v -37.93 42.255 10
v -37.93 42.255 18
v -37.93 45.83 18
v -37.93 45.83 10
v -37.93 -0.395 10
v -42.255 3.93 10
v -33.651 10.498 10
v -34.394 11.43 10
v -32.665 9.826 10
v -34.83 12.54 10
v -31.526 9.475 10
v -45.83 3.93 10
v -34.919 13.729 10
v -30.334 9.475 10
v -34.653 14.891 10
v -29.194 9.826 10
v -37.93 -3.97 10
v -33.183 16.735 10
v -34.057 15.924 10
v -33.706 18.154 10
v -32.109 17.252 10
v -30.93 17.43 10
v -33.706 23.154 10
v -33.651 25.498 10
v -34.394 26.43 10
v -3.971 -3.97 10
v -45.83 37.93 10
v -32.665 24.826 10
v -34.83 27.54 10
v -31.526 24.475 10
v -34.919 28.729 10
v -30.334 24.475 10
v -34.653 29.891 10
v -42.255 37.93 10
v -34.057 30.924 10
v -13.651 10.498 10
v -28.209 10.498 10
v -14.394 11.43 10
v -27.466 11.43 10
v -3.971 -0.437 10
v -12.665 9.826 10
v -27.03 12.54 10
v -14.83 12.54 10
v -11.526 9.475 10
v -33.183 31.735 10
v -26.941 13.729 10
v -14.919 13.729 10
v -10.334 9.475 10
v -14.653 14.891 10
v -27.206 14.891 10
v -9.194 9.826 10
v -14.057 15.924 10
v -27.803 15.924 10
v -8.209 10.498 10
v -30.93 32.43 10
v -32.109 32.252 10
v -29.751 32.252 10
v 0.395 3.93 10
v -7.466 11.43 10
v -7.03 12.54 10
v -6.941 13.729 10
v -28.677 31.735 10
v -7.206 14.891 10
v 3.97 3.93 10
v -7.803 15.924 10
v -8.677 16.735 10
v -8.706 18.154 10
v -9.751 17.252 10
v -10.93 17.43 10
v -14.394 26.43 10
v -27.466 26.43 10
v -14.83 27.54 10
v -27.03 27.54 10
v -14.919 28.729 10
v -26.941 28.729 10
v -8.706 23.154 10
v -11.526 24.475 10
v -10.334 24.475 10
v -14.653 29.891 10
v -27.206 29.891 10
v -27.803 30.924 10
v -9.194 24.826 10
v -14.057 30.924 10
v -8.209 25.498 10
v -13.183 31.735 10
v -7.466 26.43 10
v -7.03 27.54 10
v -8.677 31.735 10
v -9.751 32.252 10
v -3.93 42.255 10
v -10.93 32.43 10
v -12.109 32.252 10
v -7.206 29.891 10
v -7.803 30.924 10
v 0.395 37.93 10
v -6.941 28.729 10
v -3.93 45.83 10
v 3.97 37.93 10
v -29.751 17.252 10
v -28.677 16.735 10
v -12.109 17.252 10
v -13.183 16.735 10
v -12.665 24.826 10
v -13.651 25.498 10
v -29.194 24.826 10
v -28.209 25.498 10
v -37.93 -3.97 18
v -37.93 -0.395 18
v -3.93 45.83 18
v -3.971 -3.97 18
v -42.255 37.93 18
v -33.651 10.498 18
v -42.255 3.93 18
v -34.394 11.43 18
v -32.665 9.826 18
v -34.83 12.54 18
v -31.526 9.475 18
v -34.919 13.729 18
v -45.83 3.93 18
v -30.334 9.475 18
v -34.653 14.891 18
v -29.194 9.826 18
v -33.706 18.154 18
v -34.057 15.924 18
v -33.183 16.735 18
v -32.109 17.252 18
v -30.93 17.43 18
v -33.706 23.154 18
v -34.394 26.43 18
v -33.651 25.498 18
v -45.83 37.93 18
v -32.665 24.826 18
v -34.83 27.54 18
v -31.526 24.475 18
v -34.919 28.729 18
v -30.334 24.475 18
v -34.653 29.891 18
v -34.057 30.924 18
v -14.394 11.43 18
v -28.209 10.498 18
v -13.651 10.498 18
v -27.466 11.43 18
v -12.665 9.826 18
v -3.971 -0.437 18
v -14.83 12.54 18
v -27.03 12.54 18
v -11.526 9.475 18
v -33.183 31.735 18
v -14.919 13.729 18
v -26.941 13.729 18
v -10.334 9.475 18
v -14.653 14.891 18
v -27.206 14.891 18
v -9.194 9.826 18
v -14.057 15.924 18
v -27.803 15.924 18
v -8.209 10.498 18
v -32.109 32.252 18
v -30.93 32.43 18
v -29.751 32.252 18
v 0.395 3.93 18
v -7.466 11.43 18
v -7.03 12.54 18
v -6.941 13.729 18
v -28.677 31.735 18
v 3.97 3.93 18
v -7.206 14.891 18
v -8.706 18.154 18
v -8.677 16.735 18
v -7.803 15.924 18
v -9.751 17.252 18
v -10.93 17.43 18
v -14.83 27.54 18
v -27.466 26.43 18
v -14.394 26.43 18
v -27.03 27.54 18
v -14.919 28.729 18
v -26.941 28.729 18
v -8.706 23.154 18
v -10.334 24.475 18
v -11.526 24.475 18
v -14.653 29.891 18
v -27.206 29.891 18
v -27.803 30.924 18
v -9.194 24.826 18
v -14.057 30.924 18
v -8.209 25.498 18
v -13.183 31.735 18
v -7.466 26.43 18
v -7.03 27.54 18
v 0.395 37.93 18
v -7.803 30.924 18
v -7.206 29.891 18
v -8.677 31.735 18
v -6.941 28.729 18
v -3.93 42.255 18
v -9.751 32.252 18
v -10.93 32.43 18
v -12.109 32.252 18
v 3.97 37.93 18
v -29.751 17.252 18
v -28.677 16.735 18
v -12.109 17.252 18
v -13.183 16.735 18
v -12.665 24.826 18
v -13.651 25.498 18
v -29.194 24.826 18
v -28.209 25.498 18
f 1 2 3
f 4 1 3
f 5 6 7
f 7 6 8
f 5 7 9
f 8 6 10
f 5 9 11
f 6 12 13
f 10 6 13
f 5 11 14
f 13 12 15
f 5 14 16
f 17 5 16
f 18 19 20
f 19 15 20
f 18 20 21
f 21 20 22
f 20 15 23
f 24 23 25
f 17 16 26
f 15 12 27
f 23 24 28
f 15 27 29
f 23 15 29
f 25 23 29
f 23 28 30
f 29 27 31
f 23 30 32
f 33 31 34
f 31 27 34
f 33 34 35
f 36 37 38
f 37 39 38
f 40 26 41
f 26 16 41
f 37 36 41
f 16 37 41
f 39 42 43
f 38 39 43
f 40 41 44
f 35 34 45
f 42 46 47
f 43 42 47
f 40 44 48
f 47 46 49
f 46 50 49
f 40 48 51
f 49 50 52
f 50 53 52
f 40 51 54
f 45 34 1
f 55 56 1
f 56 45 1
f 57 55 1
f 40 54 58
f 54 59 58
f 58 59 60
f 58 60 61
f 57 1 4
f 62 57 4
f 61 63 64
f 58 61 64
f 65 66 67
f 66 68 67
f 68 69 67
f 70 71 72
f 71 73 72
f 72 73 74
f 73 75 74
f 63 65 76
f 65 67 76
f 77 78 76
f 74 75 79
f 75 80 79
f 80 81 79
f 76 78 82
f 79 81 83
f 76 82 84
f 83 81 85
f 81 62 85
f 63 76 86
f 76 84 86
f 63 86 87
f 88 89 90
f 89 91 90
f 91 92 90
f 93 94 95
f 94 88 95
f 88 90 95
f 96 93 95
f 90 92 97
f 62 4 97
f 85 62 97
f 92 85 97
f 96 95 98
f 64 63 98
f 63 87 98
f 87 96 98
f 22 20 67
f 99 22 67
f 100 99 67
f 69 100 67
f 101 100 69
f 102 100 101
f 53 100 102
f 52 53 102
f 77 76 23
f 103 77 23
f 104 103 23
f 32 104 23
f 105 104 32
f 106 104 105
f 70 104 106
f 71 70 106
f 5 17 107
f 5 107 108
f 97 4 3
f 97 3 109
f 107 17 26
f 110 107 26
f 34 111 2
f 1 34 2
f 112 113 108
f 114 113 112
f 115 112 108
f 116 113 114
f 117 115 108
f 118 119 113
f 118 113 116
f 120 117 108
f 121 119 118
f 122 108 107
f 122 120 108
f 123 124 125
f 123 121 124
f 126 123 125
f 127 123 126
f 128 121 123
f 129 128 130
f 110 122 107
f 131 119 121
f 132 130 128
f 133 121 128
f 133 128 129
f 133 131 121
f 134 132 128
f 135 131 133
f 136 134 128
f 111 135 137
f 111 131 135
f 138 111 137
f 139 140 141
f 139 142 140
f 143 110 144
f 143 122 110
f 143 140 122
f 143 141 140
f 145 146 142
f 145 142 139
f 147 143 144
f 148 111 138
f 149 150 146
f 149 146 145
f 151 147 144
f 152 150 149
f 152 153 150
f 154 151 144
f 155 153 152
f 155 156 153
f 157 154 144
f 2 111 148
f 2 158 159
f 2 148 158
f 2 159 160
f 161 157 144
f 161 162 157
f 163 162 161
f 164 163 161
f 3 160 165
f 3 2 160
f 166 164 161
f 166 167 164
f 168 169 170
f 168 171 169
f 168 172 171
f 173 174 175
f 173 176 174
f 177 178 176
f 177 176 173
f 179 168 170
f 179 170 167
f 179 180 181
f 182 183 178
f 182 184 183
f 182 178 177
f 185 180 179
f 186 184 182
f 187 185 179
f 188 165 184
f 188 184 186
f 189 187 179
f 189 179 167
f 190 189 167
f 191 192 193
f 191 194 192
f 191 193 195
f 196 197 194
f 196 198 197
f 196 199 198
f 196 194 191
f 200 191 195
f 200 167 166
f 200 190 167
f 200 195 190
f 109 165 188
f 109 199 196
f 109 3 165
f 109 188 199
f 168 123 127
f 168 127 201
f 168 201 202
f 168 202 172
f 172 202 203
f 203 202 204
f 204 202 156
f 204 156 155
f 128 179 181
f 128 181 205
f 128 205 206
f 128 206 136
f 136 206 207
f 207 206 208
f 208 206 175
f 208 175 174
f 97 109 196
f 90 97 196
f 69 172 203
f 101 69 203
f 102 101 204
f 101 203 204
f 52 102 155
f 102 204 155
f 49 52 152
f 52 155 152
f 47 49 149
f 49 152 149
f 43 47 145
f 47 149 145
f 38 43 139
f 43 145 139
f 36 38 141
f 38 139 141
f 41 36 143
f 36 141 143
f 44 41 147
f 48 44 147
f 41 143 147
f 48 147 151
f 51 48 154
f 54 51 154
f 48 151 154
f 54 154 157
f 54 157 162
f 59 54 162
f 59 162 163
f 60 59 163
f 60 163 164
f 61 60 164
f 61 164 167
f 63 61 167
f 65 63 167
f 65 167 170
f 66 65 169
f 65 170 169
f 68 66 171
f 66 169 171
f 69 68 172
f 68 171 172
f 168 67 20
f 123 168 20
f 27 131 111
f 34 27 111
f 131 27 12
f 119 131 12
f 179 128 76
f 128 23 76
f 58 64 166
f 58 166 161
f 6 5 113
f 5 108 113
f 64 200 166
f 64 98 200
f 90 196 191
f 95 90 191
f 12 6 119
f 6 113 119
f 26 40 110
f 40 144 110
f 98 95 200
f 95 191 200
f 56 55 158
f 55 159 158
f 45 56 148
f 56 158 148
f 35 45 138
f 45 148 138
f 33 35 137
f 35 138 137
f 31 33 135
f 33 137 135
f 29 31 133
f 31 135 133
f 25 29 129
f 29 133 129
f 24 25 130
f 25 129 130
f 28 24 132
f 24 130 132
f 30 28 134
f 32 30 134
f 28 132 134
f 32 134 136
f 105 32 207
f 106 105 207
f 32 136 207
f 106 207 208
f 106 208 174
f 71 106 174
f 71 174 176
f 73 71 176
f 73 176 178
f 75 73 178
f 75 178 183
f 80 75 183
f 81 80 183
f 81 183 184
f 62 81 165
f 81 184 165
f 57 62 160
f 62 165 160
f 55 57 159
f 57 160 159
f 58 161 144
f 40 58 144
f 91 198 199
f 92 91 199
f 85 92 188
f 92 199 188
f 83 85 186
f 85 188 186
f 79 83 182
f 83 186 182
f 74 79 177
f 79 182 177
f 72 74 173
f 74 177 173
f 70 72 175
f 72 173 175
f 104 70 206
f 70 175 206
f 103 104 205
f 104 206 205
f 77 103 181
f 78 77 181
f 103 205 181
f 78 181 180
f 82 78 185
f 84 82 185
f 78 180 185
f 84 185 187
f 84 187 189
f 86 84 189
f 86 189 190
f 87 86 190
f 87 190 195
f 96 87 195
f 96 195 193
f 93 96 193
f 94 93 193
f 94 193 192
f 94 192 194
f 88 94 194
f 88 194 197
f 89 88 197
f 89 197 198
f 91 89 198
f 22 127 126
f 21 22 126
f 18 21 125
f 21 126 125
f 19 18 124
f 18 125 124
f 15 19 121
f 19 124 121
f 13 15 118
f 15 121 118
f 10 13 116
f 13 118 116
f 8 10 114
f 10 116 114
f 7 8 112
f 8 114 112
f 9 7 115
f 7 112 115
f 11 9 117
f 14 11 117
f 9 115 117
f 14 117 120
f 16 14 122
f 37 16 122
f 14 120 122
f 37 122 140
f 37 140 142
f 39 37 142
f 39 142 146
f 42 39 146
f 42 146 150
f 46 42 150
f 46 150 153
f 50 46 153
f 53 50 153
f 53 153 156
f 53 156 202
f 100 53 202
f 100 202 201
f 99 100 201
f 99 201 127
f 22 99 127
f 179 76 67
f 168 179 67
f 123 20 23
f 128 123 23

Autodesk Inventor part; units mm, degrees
ref_plane "YZ Plane" through (0, 0, 0) normal (1, 0, 0) x (0, 1, 0)
ref_plane "XZ Plane" through (0, 0, 0) normal (0, 1, 0) x (-1, 0, 0)
ref_plane "Work Plane1" through (0, 0, 10) normal (0, 0, 1) x (1, 0, 0)
sketch "Sketch1" plane through (0, 0, 10) normal (0, 0, 1) x (1, 0, 0)
  line L0 (-4.0299, -0.3538) -> (-2.2322, 1.4439) construction
  arc A0 (-1.4439, 2.2322) -> (-2.2322, 1.4439) centre (-0.9299, 0.9299) ccw construction
  line L1 (-1.4439, 2.2322) -> (0.3538, 4.0299) construction
  line L2 (-37.8299, 42.8299) -> (-37.8299, 37.8299) construction
  line L3 (-37.8299, 37.8299) -> (-42.9208, 37.8299) construction
  line L4 (-37.8299, 42.2137) -> (-37.8299, 45.8299) construction
  line L5 (-37.8299, 45.8299) -> (-4.0299, 45.8299) construction
  line L6 (-4.0299, 45.8299) -> (-4.0299, 42.2137) construction
  line L7 (-4.0299, 4.0299) -> (0.3538, 4.0299) projected
  circle A1 centre (-20.9299, 20.9299) radius 17.5 projected
  line L8 (-20.9299, 58.9723) -> (17.1124, 20.9299) construction
  line L9 (17.1124, 20.9299) -> (-20.9299, -17.1124) construction
  line L10 (-20.9299, -17.1124) -> (-58.9723, 20.9299) construction
  line L11 (-58.9723, 20.9299) -> (-20.9299, 58.9723) construction
  line L12 (-20.9299, 58.9723) -> (-20.9299, -17.1124) construction
  line L13 (17.1124, 20.9299) -> (-58.9723, 20.9299) construction
  line L14 (-20.9299, 58.9723) -> (32.8701, 58.9723) construction
  line L15 (-43.4299, 43.4299) -> (1.5701, 43.4299) construction
  line L16 (1.5701, 43.4299) -> (1.5701, -1.5701) construction
  line L17 (1.5701, -1.5701) -> (-43.4299, -1.5701) construction
  line L18 (-43.4299, -1.5701) -> (-43.4299, 43.4299) construction
  line L19 (-43.4299, 43.4299) -> (1.5701, -1.5701) construction
  line L20 (1.5701, 43.4299) -> (-43.4299, -1.5701) construction
  line L21 (-43.4299, 5.3876) -> (-43.4299, 36.4723)
  line L22 (-43.4299, 36.4723) -> (-36.4723, 43.4299)
  line L23 (-36.4723, 43.4299) -> (-5.3876, 43.4299)
  line L24 (-5.3876, 43.4299) -> (1.5701, 36.4723)
  line L25 (1.5701, 36.4723) -> (1.5701, 5.3876)
  line L26 (1.5701, 5.3876) -> (-5.3876, -1.5701)
  line L27 (-5.3876, -1.5701) -> (-36.4723, -1.5701)
  line L28 (-36.4723, -1.5701) -> (-43.4299, 5.3876)
  line L29 (-4.0299, 42.2137) -> (-37.8299, 42.2137) projected
  line L30 (-4.0299, -0.3538) -> (-4.0299, 4.0299) projected
  circle A2 centre (-20.9299, 20.9299) radius 1.5
  line L31 (-10.9299, 10.9299) -> (-30.9299, 10.9299) construction
  line L32 (-30.9299, 10.9299) -> (-30.9299, 30.9299) construction
  line L33 (-30.9299, 30.9299) -> (-10.9299, 30.9299) construction
  line L34 (-10.9299, 30.9299) -> (-10.9299, 10.9299) construction
  line L35 (-10.9299, 10.9299) -> (-30.9299, 30.9299) construction
  line L36 (-30.9299, 10.9299) -> (-10.9299, 30.9299) construction
  circle A3 centre (-30.9299, 30.9299) radius 1.4
  circle A4 centre (-30.9299, 10.9299) radius 1.4
  circle A5 centre (-10.9299, 10.9299) radius 1.4
  line L37 (-45.8299, 37.8299) -> (-42.0723, 37.8299) construction
  line L38 (-42.1723, 37.7299) -> (-45.8299, 37.7299)
  line L39 (-45.8299, 37.7299) -> (-45.8299, 4.1299)
  line L40 (-45.8299, 4.1299) -> (-42.1723, 4.1299)
  line L41 (-42.1723, 4.1299) -> (-42.1723, 37.7299)
  line L42 (-45.8299, 4.0299) -> (-42.0723, 4.0299) construction
  line L43 (-45.8299, 37.8299) -> (-42.0723, 37.8299) projected
  line L44 (-37.7299, 45.8299) -> (-4.1299, 45.8299)
  line L45 (-4.1299, 45.8299) -> (-4.1299, 42.1723)
  line L46 (-4.1299, 42.1723) -> (-37.7299, 42.1723)
  line L47 (-37.7299, 42.1723) -> (-37.7299, 45.8299)
  line L48 (0.4701, 37.8299) -> (0.4701, 4.0299) construction
  line L49 (0.4701, 4.0299) -> (3.9701, 4.0299) construction
  line L50 (3.9701, 37.8299) -> (3.9701, 4.0299) construction
  line L51 (0.4701, 37.8299) -> (3.9701, 37.8299) construction
  line L52 (-45.8299, -3.9701) -> (-4.0299, -3.9701) construction
  line L53 (0.3124, 37.7299) -> (3.9701, 37.7299)
  line L54 (3.9701, 37.7299) -> (3.9701, 4.1299)
  line L55 (3.9701, 4.1299) -> (0.3124, 4.1299)
  line L56 (0.3124, 4.1299) -> (0.3124, 37.7299)
  line L57 (-4.1713, -0.3538) -> (-37.7299, -0.3538)
  line L58 (-37.7299, -0.3538) -> (-37.7299, -3.9701)
  line L59 (-37.7299, -3.9701) -> (-4.1713, -3.9701)
  line L60 (-4.1713, -3.9701) -> (-4.1713, -0.3538)
  point P0 (-37.8299, 4.0299)
  dimension "d18" = 53.8
  dimension "d19" = 45
  dimension "d20" = 53.8
  dimension "d21" = 45
  dimension "d22" = 45
  dimension "d30" = 20
  dimension "d31" = 20
  dimension "d32" = 2.8
  dimension "d33" = 2.8
  dimension "d34" = 2.8
  dimension "d35" = 3
  dimension "d36" = 0.1
  dimension "d37" = 0.1
  dimension "d38" = 0.1
  dimension "d39" = 0.1
extrude "Extrusion1" add sketch "Sketch1" along normal blind 8 contours L30 L26 L57 L28 L41 L22 L46 L24 L56 L7 | L7 L26 L30 | L56 L24 L25 L26 | L26 L25 L24 L53 L54 L55 | L60 L59 L58 L57 L28 L27 L26 | L26 L27 L28 L57 | L46 L22 L29 L24 | L24 L29 L45 | L40 L39 L38 L22 L21 L28 | L28 L21 L22 L41 | L29 L22 L23 L24 | L24 L23 L22 L29 L47 L44 L45 | L47 L29 L22 | A1 | A2 | A3 | A4 | A5
sketch "Skizze4" plane through (0, 0, 18) normal (0, 0, 1) x (1, 0, 0)
  line L0 (-37.7299, 42.1723) -> (-42.1723, 37.7299) projected
  line L1 (-42.1723, 37.7299) -> (-45.8299, 37.7299) projected
  line L2 (-45.8299, 37.7299) -> (-45.8299, 4.1299) construction
  line L3 (-45.8299, 4.1299) -> (-42.1723, 4.1299) projected
  line L4 (-42.1723, 4.1299) -> (-37.6885, -0.3538) projected
  line L5 (-37.6885, -0.3538) -> (-37.7299, -0.3538) projected
  line L6 (-37.7299, -0.3538) -> (-37.7299, -3.9701) projected
  line L7 (-37.7299, -3.9701) -> (-4.1713, -3.9701) construction
  line L8 (-4.1713, -3.9701) -> (-4.1713, -0.3538) projected
  line L9 (-4.1713, -0.3538) -> (0.3124, 4.1299) projected
  line L10 (0.3124, 4.1299) -> (3.9701, 4.1299) projected
  line L11 (3.9701, 4.1299) -> (3.9701, 37.7299) construction
  line L12 (3.9701, 37.7299) -> (0.3124, 37.7299) projected
  line L13 (0.3124, 37.7299) -> (-4.1299, 42.1723) projected
  line L14 (-4.1299, 42.1723) -> (-4.1299, 45.8299) projected
  line L15 (-4.1299, 45.8299) -> (-37.7299, 45.8299) construction
  line L16 (-37.7299, 45.8299) -> (-37.7299, 42.1723) projected
  line L17 (-37.9299, 46.0299) -> (-3.9299, 46.0299) construction
  line L18 (-3.9299, 46.0299) -> (-3.9299, 42.2551)
  line L19 (-3.9299, 42.2551) -> (0.3953, 37.9299)
  line L20 (0.3953, 37.9299) -> (4.1701, 37.9299)
  line L21 (4.1701, 37.9299) -> (4.1701, 3.9299) construction
  line L22 (4.1701, 3.9299) -> (0.3953, 3.9299)
  line L23 (0.3953, 3.9299) -> (-3.9713, -0.4367)
  line L24 (-3.9713, -0.4367) -> (-3.9713, -4.1701)
  line L25 (-3.9713, -4.1701) -> (-37.9299, -4.1701) construction
  line L26 (-37.9299, -4.1701) -> (-37.9299, -0.3953)
  line L27 (-37.9299, -0.3953) -> (-42.2551, 3.9299)
  line L28 (-42.2551, 3.9299) -> (-46.0299, 3.9299)
  line L29 (-46.0299, 3.9299) -> (-46.0299, 37.9299) construction
  line L30 (-46.0299, 37.9299) -> (-42.2551, 37.9299)
  line L31 (-42.2551, 37.9299) -> (-37.9299, 42.2551)
  line L32 (-37.9299, 42.2551) -> (-37.9299, 46.0299)
  line L33 (-45.8299, 37.7299) -> (-45.8299, 37.9299)
  line L34 (-4.1299, 45.8299) -> (-37.7299, 45.8299) projected
  line L35 (-37.7299, 45.8299) -> (-37.9299, 45.8299)
  line L36 (-4.1299, 45.8299) -> (-3.9299, 45.8299)
  line L37 (3.9701, 37.7299) -> (3.9701, 37.9299)
  line L38 (3.9701, 4.1299) -> (3.9701, 37.7299) projected
  line L39 (3.9701, 4.1299) -> (3.9701, 3.9299)
  line L40 (-4.1713, -3.9701) -> (-3.9713, -3.9701)
  line L41 (-37.7299, -3.9701) -> (-37.9299, -3.9701)
  line L42 (-45.8299, 4.1299) -> (-45.8299, 3.9299)
  point P0 (0, 0)
  dimension "d40" = 0.2
extrude "IM_offset" add sketch "Skizze4" against normal up to surface (8 mm away)
ref_plane "Arbeitsebene5" through (-20.9299, 3.9299, 10) normal (1, 0, 0) x (0, 0, -1)
ref_plane "Arbeitsebene6" through (-37.9299, 20.9299, 10) normal (0, 1, 0) x (1, 0, 0)
sketch "Skizze25" plane through (0, 0, 10) normal (0, 0, -1) x (-1, 0, 0)
  line L0 (3.9713, -3.9701) -> (37.9299, -3.9701) projected
  line L1 (37.9299, -3.9701) -> (37.9299, -0.3953) projected
  line L2 (37.9299, -0.3953) -> (42.2551, 3.9299) projected
  line L3 (42.2551, 3.9299) -> (45.8299, 3.9299) projected
  line L4 (45.8299, 3.9299) -> (45.8299, 37.9299) projected
  line L5 (45.8299, 37.9299) -> (42.2551, 37.9299) projected
  line L6 (42.2551, 37.9299) -> (37.9299, 42.2551) projected
  line L7 (37.9299, 42.2551) -> (37.9299, 45.8299) projected
  line L8 (37.9299, 45.8299) -> (3.9299, 45.8299) projected
  line L9 (3.9299, 45.8299) -> (3.9299, 42.2551) projected
  line L10 (3.9299, 42.2551) -> (-0.3953, 37.9299) projected
  line L11 (-0.3953, 37.9299) -> (-3.9701, 37.9299) projected
  line L12 (-3.9701, 37.9299) -> (-3.9701, 3.9299) projected
  line L13 (-3.9701, 3.9299) -> (-0.3953, 3.9299) projected
  line L14 (-0.3953, 3.9299) -> (3.9713, -0.4367) projected
  line L15 (3.9713, -0.4367) -> (3.9713, -3.9701) projected
  circle A0 centre (20.9299, 32.9299) radius 4
  circle A1 centre (20.9299, 8.9299) radius 4
  line L16 (-13.9301, 20.9299) -> (55.7899, 20.9299) projected
  line L17 (10.9299, 13.4299) -> (30.9299, 13.4299)
  line L18 (30.9299, 13.4299) -> (30.9299, 28.4299)
  line L19 (30.9299, 28.4299) -> (10.9299, 28.4299)
  line L20 (10.9299, 28.4299) -> (10.9299, 13.4299)
  line L21 (10.9299, 13.4299) -> (30.9299, 28.4299) construction
  line L22 (30.9299, 13.4299) -> (10.9299, 28.4299) construction
  point P0 (0, 0)
  point P1 (20.9299, 20.9299)
  dimension "d150" = 8
  dimension "d151" = 8
  dimension "d152" = 12
  dimension "d153" = 12
  dimension "d154" = 20
  dimension "d155" = 15
hole "Bohrung1" at (-30.9299, 28.4299, 10) at (-30.9299, 13.4299, 10) at (-10.9299, 13.4299, 10) at (-10.9299, 28.4299, 10) direction (0, 0, 1) diameter 8 end through all
sketch "Skizze26" plane through (0, 0, 10) normal (0, 0, -1) x (-1, 0, 0)
  circle A0 centre (10.9299, 13.4299) radius 4 projected
  circle A1 centre (30.9299, 28.4299) radius 4 projected
  circle A2 centre (30.9299, 13.4299) radius 4 projected
  circle A3 centre (10.9299, 28.4299) radius 4 projected
  line L0 (3.9713, -3.9701) -> (37.9299, -3.9701) projected
  line L1 (37.9299, -3.9701) -> (37.9299, -0.3953) projected
  line L2 (37.9299, -0.3953) -> (42.2551, 3.9299) projected
  line L3 (42.2551, 3.9299) -> (45.8299, 3.9299) projected
  line L4 (45.8299, 3.9299) -> (45.8299, 37.9299) projected
  line L5 (45.8299, 37.9299) -> (42.2551, 37.9299) projected
  line L6 (42.2551, 37.9299) -> (37.9299, 42.2551) projected
  line L7 (37.9299, 42.2551) -> (37.9299, 45.8299) projected
  line L8 (37.9299, 45.8299) -> (3.9299, 45.8299) projected
  line L9 (3.9299, 45.8299) -> (3.9299, 42.2551) projected
  line L10 (3.9299, 42.2551) -> (-0.3953, 37.9299) projected
  line L11 (-0.3953, 37.9299) -> (-3.9701, 37.9299) projected
  line L12 (-3.9701, 37.9299) -> (-3.9701, 3.9299) projected
  line L13 (-3.9701, 3.9299) -> (-0.3953, 3.9299) projected
  line L14 (-0.3953, 3.9299) -> (3.9713, -0.4367) projected
  line L15 (3.9713, -0.4367) -> (3.9713, -3.9701) projected
  line L16 (8.7057, 18.1542) -> (33.7057, 18.1542)
  line L17 (33.7057, 18.1542) -> (33.7057, 23.1542)
  line L18 (33.7057, 23.1542) -> (8.7057, 23.1542)
  line L19 (8.7057, 23.1542) -> (8.7057, 18.1542)
  line L20 (8.7057, 18.1542) -> (33.7057, 23.1542) construction
  line L21 (33.7057, 18.1542) -> (8.7057, 23.1542) construction
  point P0 (0, 0)
  point P1 (21.2057, 20.6542)
  dimension "d163" = 25
  dimension "d164" = 5
extrude "Extrusion21" cut sketch "Skizze26" against normal blind 10 contours L19 L18 L17 L16
properties part number "20_Cube_Insert_Filter_25mm"
